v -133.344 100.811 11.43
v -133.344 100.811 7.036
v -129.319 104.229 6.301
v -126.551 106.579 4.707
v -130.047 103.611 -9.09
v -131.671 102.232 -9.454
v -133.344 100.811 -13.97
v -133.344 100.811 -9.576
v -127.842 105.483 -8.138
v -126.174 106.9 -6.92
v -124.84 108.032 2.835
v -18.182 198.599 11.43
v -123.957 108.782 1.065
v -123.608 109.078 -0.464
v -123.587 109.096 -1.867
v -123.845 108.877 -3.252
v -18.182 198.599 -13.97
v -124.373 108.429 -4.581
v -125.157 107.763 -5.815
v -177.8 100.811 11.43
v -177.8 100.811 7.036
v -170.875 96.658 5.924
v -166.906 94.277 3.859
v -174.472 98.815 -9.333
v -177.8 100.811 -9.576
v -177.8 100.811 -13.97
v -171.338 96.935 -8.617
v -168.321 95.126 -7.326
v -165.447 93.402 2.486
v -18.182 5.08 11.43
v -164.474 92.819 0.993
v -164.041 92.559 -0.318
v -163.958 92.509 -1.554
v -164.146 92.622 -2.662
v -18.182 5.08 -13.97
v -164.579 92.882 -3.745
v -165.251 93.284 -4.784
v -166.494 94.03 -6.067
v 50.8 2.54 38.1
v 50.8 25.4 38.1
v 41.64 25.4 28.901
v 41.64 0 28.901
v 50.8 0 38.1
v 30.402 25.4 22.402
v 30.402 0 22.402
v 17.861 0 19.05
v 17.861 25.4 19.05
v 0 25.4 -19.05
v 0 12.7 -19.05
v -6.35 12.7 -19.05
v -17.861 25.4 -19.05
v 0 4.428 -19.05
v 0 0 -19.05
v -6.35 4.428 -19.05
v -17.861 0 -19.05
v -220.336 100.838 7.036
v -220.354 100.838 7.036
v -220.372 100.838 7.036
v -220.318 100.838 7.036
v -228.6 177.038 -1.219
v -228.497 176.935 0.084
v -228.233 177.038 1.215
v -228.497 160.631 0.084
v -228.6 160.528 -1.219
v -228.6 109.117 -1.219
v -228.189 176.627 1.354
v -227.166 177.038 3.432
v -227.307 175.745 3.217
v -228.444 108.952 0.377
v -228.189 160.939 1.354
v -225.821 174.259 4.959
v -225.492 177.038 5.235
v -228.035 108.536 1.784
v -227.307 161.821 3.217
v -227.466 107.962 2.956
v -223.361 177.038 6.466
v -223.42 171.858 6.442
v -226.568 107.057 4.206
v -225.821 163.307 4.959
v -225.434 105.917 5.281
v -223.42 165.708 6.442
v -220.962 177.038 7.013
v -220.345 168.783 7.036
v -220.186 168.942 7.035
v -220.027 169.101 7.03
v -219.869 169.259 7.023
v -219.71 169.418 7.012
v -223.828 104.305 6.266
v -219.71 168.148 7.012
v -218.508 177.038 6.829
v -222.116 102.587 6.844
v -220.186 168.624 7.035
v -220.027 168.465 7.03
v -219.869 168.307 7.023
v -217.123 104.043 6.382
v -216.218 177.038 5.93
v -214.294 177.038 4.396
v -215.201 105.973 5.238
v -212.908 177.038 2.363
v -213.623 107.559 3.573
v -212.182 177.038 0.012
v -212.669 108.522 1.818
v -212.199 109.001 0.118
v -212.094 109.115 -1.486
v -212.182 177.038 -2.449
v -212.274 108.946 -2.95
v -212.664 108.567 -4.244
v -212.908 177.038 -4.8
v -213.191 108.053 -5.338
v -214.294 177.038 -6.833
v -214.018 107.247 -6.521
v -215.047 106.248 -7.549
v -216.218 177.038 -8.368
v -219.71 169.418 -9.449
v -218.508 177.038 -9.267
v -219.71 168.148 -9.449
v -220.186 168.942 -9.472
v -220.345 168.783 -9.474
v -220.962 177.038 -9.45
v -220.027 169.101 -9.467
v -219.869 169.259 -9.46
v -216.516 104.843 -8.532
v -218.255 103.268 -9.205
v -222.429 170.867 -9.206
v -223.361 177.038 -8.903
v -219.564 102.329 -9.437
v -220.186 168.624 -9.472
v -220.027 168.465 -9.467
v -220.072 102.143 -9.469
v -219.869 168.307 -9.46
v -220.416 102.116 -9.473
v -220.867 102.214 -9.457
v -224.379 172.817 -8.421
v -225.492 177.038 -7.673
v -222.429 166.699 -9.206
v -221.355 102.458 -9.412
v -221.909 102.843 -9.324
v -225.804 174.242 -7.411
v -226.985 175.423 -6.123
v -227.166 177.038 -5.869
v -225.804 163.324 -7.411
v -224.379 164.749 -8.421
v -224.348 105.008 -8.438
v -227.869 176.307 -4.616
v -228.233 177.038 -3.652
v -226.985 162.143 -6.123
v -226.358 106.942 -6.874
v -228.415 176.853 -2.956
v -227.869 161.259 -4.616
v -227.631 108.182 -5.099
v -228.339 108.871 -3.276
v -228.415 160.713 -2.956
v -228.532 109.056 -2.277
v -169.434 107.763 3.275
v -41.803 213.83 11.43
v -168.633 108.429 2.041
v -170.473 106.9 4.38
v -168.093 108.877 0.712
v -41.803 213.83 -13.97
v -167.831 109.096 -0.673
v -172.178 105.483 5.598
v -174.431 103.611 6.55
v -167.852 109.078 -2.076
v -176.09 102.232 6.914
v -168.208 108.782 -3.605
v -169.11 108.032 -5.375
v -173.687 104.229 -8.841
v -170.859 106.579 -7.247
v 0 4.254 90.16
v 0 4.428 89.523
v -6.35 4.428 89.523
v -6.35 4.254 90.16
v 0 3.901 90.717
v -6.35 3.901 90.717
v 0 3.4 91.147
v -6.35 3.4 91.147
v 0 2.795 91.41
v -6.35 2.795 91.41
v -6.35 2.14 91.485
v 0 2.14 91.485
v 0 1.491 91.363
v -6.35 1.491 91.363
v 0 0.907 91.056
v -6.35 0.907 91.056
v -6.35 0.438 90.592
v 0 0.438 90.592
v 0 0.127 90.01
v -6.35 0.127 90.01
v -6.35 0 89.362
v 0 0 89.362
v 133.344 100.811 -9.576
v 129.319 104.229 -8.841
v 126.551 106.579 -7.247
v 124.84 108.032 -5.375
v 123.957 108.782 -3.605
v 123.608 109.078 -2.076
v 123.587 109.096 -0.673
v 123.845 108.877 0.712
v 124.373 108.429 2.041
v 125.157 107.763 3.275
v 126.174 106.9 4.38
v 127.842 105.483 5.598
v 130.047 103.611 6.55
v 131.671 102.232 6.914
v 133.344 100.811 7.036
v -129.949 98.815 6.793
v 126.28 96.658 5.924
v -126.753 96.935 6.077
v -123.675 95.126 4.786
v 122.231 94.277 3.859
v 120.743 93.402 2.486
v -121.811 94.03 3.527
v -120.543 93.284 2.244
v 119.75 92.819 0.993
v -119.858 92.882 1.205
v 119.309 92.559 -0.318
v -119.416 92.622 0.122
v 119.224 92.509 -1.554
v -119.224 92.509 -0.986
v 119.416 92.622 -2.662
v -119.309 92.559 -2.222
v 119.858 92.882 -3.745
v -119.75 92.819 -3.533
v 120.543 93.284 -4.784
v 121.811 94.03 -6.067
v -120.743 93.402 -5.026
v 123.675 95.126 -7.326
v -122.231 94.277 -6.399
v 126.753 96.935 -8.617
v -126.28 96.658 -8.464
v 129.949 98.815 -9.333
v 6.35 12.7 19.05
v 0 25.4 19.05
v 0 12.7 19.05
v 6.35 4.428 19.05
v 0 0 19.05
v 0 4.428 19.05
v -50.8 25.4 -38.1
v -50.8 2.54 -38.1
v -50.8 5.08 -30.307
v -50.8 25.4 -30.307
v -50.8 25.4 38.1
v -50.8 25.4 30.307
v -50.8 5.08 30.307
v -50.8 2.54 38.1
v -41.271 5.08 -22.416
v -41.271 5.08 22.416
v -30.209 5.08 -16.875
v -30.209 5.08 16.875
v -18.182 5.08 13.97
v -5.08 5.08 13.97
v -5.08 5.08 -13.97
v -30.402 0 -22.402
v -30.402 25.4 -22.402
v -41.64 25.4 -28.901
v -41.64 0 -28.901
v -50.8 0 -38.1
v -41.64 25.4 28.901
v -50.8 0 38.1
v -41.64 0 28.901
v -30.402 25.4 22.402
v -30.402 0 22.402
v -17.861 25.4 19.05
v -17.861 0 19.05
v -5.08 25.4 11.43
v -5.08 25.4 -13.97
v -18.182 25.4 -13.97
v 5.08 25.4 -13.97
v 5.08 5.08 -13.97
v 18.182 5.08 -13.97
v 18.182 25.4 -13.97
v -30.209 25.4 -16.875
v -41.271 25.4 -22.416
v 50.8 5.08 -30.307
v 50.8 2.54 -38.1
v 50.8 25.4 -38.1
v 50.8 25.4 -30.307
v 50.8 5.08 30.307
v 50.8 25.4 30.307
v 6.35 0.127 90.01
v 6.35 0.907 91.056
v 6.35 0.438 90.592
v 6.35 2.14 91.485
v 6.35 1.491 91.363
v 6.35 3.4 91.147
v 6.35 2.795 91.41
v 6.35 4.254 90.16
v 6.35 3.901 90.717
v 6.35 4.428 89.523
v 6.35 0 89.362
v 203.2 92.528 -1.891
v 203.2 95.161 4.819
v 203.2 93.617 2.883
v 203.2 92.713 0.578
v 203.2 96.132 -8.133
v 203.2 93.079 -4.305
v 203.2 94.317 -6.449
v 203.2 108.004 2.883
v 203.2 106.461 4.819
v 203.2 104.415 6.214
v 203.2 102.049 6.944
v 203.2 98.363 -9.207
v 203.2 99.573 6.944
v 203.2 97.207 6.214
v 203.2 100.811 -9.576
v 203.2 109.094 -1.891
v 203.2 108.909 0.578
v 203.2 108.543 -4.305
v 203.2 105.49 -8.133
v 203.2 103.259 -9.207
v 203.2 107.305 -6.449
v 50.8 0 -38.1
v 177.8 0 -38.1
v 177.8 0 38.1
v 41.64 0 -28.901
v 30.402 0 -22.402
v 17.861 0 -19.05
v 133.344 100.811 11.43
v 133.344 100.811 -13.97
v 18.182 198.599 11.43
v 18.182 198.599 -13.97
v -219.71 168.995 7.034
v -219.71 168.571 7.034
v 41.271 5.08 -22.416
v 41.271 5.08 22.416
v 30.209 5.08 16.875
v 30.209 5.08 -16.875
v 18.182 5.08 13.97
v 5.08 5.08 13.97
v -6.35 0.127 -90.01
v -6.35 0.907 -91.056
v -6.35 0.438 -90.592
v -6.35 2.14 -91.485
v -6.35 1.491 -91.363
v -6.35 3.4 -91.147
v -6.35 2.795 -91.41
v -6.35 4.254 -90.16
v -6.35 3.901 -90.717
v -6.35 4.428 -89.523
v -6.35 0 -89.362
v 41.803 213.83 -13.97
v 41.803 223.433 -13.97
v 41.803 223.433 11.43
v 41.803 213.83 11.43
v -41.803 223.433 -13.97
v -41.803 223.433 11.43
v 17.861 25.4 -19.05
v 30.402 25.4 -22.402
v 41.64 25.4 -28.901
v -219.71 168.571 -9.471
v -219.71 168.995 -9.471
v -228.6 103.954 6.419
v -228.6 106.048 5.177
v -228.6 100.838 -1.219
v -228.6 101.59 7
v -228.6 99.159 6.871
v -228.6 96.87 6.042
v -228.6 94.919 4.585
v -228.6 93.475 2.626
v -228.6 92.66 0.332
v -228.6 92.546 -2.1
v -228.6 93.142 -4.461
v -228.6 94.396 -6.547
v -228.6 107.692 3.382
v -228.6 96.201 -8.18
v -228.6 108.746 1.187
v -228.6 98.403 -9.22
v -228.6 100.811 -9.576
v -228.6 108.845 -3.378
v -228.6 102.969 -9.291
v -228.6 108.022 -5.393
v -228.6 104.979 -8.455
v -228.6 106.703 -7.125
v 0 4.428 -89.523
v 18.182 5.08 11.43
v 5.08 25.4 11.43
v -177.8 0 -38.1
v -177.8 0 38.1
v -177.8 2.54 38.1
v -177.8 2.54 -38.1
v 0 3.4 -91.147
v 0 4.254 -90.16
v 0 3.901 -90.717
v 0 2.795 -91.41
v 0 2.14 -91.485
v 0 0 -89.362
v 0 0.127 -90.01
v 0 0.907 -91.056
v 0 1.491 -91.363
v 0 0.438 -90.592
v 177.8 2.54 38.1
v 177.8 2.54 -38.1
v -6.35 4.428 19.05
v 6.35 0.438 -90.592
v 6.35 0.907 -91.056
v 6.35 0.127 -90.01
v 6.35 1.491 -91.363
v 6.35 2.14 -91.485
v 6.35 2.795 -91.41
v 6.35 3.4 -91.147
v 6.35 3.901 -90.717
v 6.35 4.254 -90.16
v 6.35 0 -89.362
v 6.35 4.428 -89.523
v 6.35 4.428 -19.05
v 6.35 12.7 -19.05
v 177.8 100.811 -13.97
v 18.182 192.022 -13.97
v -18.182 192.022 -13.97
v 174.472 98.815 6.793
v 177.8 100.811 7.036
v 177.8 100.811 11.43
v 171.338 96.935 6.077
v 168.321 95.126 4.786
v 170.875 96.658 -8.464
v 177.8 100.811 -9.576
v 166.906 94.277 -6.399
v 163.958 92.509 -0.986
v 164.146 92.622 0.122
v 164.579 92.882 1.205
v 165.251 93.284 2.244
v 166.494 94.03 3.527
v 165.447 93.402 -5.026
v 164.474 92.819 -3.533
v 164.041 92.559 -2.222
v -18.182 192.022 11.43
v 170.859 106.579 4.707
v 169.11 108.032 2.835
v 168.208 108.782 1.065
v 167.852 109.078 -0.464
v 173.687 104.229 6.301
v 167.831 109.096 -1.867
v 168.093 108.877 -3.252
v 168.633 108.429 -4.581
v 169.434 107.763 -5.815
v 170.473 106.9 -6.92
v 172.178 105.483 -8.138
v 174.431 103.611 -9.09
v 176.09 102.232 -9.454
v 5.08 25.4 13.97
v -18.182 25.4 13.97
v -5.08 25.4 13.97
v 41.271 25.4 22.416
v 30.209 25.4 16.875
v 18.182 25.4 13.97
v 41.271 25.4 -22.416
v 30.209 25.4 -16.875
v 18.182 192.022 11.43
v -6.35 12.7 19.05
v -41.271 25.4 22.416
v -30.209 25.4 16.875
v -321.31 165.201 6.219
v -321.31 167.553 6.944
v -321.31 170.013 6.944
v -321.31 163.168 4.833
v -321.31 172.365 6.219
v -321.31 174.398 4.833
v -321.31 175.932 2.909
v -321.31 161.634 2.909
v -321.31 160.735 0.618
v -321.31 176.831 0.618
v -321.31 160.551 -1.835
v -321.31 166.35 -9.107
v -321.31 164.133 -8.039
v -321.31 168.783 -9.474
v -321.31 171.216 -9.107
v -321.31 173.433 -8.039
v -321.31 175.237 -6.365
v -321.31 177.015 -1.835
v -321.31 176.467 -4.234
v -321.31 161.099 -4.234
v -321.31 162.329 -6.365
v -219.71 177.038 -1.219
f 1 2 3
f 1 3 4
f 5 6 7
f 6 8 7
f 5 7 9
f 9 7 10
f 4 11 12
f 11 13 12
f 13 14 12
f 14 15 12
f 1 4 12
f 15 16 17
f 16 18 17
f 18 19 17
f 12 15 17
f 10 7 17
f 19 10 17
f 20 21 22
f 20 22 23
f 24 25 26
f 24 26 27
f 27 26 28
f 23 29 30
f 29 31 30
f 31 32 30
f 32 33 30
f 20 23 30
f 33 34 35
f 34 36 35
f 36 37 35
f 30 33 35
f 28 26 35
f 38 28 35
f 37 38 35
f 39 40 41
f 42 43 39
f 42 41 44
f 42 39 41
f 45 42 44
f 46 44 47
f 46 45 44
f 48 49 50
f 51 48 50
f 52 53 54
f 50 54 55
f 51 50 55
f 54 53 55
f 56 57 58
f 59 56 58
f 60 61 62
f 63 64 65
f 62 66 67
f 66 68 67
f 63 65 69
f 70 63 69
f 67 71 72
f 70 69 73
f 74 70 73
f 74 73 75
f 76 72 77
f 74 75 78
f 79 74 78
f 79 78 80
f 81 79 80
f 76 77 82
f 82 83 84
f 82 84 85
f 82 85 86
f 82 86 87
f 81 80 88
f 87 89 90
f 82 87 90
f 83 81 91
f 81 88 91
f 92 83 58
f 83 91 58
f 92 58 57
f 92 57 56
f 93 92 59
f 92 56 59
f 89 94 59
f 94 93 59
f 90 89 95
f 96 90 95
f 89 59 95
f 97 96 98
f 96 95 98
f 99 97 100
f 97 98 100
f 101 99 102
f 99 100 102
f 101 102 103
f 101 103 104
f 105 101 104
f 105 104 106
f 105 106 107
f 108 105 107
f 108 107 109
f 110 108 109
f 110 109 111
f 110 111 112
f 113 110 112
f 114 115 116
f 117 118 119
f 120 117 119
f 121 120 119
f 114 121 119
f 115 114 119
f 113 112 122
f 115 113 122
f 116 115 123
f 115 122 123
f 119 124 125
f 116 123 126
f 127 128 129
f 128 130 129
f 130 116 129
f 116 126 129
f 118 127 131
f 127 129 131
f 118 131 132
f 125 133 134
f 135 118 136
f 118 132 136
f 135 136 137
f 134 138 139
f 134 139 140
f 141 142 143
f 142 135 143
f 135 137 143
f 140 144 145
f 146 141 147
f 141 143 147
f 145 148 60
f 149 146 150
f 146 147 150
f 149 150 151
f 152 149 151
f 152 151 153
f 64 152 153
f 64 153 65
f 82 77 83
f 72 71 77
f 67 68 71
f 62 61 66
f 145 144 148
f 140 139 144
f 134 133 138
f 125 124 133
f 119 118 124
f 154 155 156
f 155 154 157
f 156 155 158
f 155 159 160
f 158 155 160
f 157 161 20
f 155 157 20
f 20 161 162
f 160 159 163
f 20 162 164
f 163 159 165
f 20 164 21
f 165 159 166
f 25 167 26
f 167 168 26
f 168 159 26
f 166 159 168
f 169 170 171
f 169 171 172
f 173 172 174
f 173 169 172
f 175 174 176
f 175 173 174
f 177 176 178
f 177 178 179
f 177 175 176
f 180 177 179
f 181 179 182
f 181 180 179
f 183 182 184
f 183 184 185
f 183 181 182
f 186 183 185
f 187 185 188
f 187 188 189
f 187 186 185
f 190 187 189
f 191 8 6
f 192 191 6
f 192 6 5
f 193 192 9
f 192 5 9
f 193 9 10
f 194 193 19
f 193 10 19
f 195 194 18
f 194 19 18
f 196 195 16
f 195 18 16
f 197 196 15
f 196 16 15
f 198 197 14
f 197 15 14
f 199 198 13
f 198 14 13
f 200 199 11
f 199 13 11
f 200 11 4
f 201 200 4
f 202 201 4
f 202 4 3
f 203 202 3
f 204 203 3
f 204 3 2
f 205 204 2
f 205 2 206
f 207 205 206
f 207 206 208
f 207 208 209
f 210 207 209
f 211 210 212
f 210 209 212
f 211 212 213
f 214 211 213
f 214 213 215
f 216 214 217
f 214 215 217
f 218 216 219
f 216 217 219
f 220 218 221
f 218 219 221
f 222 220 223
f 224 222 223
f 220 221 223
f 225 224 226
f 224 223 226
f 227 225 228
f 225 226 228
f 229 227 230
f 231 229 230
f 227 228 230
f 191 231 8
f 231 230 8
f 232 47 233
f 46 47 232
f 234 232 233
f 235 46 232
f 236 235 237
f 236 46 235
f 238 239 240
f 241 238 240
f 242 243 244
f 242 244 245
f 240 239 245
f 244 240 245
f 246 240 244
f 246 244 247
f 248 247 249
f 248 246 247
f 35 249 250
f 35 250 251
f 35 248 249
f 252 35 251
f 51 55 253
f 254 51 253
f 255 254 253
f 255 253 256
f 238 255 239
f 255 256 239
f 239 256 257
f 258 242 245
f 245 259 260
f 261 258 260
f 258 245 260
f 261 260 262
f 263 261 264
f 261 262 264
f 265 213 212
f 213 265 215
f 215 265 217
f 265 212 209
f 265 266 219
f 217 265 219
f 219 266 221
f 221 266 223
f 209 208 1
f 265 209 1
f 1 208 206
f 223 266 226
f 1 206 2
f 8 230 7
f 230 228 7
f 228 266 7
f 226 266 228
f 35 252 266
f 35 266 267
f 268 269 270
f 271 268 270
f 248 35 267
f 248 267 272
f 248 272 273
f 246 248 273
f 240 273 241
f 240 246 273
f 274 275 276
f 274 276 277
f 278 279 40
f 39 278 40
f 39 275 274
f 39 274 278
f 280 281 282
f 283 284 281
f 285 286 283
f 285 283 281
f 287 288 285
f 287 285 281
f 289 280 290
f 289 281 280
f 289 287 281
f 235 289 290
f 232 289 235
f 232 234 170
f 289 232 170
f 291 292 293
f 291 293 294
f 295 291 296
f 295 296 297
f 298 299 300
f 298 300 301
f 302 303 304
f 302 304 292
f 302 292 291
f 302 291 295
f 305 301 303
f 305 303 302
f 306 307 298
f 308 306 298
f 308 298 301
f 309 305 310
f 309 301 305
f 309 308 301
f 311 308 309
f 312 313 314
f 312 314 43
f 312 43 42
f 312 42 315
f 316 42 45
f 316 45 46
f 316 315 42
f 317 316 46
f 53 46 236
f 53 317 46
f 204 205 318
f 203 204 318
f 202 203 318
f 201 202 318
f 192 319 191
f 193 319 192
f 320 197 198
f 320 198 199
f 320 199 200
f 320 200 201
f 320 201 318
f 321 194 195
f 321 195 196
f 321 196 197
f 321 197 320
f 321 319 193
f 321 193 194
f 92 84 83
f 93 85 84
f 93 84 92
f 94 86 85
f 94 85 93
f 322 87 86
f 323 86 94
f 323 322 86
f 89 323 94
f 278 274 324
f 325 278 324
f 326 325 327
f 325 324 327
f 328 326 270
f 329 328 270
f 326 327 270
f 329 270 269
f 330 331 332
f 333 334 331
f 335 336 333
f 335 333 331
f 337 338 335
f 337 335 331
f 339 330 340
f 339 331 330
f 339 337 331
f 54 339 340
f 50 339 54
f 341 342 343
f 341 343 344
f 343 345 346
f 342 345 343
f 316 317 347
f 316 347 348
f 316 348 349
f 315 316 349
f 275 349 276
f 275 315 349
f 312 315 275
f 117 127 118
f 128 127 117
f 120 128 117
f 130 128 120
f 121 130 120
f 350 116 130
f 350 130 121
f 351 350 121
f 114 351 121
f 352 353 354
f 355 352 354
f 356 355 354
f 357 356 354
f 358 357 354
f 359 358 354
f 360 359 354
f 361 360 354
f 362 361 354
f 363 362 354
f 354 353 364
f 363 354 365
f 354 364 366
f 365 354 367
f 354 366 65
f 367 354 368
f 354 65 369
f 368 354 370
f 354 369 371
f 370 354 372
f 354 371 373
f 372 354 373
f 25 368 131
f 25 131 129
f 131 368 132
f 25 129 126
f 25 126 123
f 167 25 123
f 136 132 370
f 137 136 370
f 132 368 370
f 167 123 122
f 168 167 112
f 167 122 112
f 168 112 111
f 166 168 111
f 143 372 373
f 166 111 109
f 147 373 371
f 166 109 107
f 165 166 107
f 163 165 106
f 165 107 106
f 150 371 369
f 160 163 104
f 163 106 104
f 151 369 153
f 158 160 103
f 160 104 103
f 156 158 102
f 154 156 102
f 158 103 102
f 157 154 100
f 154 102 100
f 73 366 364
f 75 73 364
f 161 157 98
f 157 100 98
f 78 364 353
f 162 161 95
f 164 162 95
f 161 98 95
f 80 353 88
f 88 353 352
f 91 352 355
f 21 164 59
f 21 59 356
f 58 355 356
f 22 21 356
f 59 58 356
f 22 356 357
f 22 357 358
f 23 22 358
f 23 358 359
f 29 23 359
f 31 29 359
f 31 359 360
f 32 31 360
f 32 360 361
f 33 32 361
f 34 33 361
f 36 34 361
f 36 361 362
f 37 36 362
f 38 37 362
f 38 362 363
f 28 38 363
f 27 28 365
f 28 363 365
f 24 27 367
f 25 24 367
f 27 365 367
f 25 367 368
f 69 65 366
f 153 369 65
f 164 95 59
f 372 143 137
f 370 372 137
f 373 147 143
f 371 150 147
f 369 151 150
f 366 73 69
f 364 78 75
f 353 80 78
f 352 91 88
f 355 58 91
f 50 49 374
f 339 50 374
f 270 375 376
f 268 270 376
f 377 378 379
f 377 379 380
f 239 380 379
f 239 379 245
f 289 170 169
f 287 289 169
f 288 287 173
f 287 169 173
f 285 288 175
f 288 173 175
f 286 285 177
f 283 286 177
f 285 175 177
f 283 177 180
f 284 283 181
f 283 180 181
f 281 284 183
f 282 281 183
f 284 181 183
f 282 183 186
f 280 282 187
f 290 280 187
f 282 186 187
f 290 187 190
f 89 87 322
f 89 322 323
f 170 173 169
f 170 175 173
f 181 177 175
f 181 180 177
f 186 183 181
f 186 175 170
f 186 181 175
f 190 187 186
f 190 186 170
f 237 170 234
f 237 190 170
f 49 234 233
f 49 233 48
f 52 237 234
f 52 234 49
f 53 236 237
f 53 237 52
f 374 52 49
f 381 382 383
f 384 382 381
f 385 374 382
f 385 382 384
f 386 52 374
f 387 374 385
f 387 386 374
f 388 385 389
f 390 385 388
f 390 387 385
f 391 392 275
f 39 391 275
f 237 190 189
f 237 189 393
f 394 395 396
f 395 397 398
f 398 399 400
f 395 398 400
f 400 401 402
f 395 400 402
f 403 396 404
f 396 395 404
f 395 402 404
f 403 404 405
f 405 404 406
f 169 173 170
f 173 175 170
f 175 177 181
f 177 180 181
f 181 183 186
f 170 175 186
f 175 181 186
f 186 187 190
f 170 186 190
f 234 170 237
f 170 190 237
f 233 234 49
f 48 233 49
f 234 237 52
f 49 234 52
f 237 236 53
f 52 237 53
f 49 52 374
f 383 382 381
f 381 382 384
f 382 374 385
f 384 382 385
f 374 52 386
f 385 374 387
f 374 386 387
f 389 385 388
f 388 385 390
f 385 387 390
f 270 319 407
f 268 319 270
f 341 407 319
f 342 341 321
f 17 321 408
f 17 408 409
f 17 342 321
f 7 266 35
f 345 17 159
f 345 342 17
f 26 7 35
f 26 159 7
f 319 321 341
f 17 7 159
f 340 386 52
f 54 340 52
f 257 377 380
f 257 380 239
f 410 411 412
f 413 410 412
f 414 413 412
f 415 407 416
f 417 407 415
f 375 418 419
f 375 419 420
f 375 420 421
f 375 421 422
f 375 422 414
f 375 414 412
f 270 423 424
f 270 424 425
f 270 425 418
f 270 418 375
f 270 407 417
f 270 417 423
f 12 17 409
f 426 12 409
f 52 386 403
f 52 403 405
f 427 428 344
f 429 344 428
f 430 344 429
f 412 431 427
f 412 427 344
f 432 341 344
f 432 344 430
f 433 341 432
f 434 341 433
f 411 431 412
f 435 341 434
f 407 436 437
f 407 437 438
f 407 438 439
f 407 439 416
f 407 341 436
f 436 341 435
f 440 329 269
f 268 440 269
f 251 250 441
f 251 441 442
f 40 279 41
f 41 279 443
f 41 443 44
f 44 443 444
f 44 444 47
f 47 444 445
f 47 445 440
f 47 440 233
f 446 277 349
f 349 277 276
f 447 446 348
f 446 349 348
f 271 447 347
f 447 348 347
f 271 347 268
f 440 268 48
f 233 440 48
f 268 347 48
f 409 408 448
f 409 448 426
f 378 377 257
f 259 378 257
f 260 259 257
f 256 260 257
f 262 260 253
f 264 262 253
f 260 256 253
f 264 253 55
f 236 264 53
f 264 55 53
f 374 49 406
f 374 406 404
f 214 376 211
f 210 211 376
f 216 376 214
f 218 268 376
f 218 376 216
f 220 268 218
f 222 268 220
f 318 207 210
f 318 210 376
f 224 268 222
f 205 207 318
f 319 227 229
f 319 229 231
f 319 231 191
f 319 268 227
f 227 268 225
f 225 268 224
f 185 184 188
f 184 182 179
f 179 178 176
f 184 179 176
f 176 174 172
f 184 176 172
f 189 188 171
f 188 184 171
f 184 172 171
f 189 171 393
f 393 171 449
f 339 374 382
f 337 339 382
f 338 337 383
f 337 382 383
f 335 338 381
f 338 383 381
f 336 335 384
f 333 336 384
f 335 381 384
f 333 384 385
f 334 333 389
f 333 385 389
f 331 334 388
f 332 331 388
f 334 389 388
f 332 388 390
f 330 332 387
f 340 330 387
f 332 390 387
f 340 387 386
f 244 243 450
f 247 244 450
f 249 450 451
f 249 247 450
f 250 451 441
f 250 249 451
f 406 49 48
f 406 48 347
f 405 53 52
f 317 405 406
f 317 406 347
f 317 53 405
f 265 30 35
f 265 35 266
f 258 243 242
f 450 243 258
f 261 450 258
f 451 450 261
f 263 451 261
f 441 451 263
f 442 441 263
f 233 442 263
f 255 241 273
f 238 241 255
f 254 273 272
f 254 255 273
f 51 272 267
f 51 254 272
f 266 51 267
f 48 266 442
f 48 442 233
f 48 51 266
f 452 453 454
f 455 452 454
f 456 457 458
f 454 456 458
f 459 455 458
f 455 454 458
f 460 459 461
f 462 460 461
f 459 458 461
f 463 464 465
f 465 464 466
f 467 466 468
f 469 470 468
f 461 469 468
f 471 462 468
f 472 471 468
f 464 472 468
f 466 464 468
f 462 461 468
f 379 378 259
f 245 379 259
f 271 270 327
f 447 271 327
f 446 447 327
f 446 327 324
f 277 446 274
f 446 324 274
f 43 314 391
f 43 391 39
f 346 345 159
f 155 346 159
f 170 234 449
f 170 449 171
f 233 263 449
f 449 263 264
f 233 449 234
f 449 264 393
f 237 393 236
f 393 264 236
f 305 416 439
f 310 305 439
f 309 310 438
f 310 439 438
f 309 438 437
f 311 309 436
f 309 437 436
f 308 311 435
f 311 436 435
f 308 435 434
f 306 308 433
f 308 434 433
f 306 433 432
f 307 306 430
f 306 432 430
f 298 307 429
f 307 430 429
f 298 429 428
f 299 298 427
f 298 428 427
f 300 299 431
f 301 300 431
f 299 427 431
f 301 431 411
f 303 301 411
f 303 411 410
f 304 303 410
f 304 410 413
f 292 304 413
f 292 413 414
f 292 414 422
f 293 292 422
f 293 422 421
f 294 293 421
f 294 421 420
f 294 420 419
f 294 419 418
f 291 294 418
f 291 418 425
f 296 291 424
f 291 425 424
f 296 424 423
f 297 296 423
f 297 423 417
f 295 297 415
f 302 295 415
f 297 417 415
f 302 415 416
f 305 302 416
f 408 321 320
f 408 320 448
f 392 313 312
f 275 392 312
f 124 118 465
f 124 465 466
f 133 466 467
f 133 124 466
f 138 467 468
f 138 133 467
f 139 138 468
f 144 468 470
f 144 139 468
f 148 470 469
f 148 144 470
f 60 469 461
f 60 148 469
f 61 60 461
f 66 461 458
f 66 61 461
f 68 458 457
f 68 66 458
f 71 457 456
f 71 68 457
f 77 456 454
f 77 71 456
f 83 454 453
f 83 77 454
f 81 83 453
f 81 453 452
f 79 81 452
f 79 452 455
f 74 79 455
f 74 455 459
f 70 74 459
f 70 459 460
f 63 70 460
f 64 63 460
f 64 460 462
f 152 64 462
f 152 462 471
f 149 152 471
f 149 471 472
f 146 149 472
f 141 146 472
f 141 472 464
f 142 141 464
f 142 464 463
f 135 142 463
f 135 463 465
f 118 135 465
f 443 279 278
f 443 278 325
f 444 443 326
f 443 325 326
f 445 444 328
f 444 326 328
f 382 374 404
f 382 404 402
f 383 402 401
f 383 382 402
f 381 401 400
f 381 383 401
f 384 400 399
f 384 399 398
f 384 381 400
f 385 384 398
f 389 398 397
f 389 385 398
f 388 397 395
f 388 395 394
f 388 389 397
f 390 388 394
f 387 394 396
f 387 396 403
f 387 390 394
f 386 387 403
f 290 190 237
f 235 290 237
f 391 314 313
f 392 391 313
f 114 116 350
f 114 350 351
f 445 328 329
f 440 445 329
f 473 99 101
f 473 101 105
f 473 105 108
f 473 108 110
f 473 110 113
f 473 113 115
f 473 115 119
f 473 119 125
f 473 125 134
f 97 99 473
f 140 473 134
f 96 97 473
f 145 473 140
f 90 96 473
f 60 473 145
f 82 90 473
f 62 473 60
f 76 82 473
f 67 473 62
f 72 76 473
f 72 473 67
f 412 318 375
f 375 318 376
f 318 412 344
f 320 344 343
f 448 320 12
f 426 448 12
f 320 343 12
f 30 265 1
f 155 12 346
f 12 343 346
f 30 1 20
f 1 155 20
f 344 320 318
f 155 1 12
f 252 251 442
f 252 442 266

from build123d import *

# Parameters (mm, degrees)
SKETCH2_W                 = 127
SKETCH2_H                 = 76.2
BOSS_EXTRUDE1_DEPTH       = 2.54
BOSS_EXTRUDE2_DEPTH       = 25.4
SHELL1_START              = 5.08
SHELL1_DEPTH              = 20.32
BOSS_EXTRUDE10_DEPTH      = 25.4
BOSS_EXTRUDE11_DEPTH      = 6.35
BOSS_EXTRUDE12_DEPTH      = 203.2
BOSS_EXTRUDE12_DEPTH_BACK = 228.6
SKETCH9_R                 = 8.30646
SKETCH10_R                = 8.255
BOSS_EXTRUDE13_DEPTH      = 76.2
SKETCH11_R                = 8.255
BOSS_EXTRUDE14_DEPTH      = 101.6


# Read off the part's stored shape, not the designer's step: Shell1
with BuildPart() as part:
    # Sketch2 → Boss-Extrude1 (new body)
    with BuildSketch(Plane(origin=(0, 0, 0), x_dir=(1, 0, 0), z_dir=(0, 1, 0))):
        with Locations((-114.3, 0)):
            Rectangle(SKETCH2_W, SKETCH2_H)
    extrude(amount=BOSS_EXTRUDE1_DEPTH)

    # Sketch6 → Boss-Extrude2 (add)
    with BuildSketch(Plane(origin=(0, 0, 0), x_dir=(1, 0, 0), z_dir=(0, 1, 0))):
        with BuildLine():
            Line((-17.860834, -19.05), (0, -19.05))
            Line((0, -19.05), (0, 19.05))
            Line((0, 19.05), (-17.860834, 19.05))
            ThreePointArc((-17.860834, 19.05), (-36.23522, 25.281425), (-50.8, 38.1))
            Line((-50.8, 38.1), (-50.8, -38.1))
            ThreePointArc((-50.8, -38.1), (-36.23522, -25.281425), (-17.860834, -19.05))
        make_face()
    extrude(amount=BOSS_EXTRUDE2_DEPTH)

    # Shell1 outline → Shell1 (cut)
    with BuildSketch(Plane(origin=(0, 0, 0), x_dir=(1, 0, 0), z_dir=(0, 1, 0)).offset(SHELL1_START)):
        with BuildLine():
            Line((-50.8, 30.306695), (-50.8, -30.306695))
            ThreePointArc((-50.8, -30.306695), (-35.897253, -19.331005), (-18.182365, -13.97))
            Line((-18.182365, -13.97), (-5.08, -13.97))
            Line((-5.08, -13.97), (-5.08, 13.97))
            Line((-5.08, 13.97), (-18.182365, 13.97))
            ThreePointArc((-18.182365, 13.97), (-35.897253, 19.331005), (-50.8, 30.306695))
        make_face()
    extrude(amount=SHELL1_DEPTH, mode=Mode.SUBTRACT)

    # Sketch8 → Boss-Extrude11 (add)
    with BuildSketch(Plane(origin=(0, 0, 0), x_dir=(0, 0, -1), z_dir=(1, 0, 0))):
        with BuildLine():
            Line((-19.05, 12.7), (-89.522816, 4.427597))
            ThreePointArc((-89.522816, 4.427597), (-91.484716, 2.139673), (-89.362112, 0))
            Line((-89.362112, 0), (-19.05, 4.427597))
            Line((-19.05, 4.427597), (-19.05, 12.7))
        make_face()
    boss_extrude11 = extrude(amount=-BOSS_EXTRUDE11_DEPTH)

    # Mirror2: Boss-Extrude11 across plane
    add(boss_extrude11.mirror(Plane.XY))


with BuildPart() as body_2:
    # Sketch7 → Boss-Extrude10 (new body)
    with BuildSketch(Plane.XY.offset(-13.97)):
        Polygon((-5.08, 25.4), (-133.344275, 100.810876), (-18.182365, 198.599225), (-18.182365, 192.021824), (0, 192.021824), (0, 223.432601), (-41.80297, 223.432601), (-41.80297, 213.829825), (-177.8, 100.810876), (-18.182365, 5.08), align=None)
    extrude(amount=BOSS_EXTRUDE10_DEPTH)


with BuildPart() as body_3:
    # Mirror3: mirrored copy
    add(body_2.part.mirror(Plane(origin=(0, 0, 0), x_dir=(0, 0, 1), z_dir=(1, 0, 0))))


with BuildPart() as body_4:
    # Mirror3 2: mirrored copy
    add(part.part.mirror(Plane(origin=(0, 0, 0), x_dir=(0, 0, 1), z_dir=(1, 0, 0))))


with BuildPart() as body_2_1:
    add(body_2.part)

    add(body_3.part)  # Boss-Extrude12 merges body 3
    # Sketch9 → Boss-Extrude12 (add, two sides: drawn at the far end of the back side and taken through both)
    with BuildSketch(Plane(origin=(0, 0, 0), x_dir=(0, 0, -1), z_dir=(1, 0, 0)).offset(-BOSS_EXTRUDE12_DEPTH_BACK)):
        with Locations((1.27, 100.810876)):
            Circle(SKETCH9_R)
    extrude(amount=BOSS_EXTRUDE12_DEPTH + BOSS_EXTRUDE12_DEPTH_BACK)

    # Sketch10 → Boss-Extrude13 (add)
    with BuildSketch(Plane(origin=(0, 100.838, 0), x_dir=(1, 0, 0), z_dir=(0, 1, 0))):
        with Locations(Location((-220.345, 1.21854, 0), (0, 0, 180))):
            Circle(SKETCH10_R)
    extrude(amount=BOSS_EXTRUDE13_DEPTH)

    # Sketch11 → Boss-Extrude14 (add)
    with BuildSketch(Plane(origin=(-219.71, 0, 0), x_dir=(0, 0, -1), z_dir=(1, 0, 0))):
        with Locations((1.21854, 168.783)):
            Circle(SKETCH11_R)
    extrude(amount=-BOSS_EXTRUDE14_DEPTH)


solid = Compound([part.part, body_4.part, body_2_1.part])
